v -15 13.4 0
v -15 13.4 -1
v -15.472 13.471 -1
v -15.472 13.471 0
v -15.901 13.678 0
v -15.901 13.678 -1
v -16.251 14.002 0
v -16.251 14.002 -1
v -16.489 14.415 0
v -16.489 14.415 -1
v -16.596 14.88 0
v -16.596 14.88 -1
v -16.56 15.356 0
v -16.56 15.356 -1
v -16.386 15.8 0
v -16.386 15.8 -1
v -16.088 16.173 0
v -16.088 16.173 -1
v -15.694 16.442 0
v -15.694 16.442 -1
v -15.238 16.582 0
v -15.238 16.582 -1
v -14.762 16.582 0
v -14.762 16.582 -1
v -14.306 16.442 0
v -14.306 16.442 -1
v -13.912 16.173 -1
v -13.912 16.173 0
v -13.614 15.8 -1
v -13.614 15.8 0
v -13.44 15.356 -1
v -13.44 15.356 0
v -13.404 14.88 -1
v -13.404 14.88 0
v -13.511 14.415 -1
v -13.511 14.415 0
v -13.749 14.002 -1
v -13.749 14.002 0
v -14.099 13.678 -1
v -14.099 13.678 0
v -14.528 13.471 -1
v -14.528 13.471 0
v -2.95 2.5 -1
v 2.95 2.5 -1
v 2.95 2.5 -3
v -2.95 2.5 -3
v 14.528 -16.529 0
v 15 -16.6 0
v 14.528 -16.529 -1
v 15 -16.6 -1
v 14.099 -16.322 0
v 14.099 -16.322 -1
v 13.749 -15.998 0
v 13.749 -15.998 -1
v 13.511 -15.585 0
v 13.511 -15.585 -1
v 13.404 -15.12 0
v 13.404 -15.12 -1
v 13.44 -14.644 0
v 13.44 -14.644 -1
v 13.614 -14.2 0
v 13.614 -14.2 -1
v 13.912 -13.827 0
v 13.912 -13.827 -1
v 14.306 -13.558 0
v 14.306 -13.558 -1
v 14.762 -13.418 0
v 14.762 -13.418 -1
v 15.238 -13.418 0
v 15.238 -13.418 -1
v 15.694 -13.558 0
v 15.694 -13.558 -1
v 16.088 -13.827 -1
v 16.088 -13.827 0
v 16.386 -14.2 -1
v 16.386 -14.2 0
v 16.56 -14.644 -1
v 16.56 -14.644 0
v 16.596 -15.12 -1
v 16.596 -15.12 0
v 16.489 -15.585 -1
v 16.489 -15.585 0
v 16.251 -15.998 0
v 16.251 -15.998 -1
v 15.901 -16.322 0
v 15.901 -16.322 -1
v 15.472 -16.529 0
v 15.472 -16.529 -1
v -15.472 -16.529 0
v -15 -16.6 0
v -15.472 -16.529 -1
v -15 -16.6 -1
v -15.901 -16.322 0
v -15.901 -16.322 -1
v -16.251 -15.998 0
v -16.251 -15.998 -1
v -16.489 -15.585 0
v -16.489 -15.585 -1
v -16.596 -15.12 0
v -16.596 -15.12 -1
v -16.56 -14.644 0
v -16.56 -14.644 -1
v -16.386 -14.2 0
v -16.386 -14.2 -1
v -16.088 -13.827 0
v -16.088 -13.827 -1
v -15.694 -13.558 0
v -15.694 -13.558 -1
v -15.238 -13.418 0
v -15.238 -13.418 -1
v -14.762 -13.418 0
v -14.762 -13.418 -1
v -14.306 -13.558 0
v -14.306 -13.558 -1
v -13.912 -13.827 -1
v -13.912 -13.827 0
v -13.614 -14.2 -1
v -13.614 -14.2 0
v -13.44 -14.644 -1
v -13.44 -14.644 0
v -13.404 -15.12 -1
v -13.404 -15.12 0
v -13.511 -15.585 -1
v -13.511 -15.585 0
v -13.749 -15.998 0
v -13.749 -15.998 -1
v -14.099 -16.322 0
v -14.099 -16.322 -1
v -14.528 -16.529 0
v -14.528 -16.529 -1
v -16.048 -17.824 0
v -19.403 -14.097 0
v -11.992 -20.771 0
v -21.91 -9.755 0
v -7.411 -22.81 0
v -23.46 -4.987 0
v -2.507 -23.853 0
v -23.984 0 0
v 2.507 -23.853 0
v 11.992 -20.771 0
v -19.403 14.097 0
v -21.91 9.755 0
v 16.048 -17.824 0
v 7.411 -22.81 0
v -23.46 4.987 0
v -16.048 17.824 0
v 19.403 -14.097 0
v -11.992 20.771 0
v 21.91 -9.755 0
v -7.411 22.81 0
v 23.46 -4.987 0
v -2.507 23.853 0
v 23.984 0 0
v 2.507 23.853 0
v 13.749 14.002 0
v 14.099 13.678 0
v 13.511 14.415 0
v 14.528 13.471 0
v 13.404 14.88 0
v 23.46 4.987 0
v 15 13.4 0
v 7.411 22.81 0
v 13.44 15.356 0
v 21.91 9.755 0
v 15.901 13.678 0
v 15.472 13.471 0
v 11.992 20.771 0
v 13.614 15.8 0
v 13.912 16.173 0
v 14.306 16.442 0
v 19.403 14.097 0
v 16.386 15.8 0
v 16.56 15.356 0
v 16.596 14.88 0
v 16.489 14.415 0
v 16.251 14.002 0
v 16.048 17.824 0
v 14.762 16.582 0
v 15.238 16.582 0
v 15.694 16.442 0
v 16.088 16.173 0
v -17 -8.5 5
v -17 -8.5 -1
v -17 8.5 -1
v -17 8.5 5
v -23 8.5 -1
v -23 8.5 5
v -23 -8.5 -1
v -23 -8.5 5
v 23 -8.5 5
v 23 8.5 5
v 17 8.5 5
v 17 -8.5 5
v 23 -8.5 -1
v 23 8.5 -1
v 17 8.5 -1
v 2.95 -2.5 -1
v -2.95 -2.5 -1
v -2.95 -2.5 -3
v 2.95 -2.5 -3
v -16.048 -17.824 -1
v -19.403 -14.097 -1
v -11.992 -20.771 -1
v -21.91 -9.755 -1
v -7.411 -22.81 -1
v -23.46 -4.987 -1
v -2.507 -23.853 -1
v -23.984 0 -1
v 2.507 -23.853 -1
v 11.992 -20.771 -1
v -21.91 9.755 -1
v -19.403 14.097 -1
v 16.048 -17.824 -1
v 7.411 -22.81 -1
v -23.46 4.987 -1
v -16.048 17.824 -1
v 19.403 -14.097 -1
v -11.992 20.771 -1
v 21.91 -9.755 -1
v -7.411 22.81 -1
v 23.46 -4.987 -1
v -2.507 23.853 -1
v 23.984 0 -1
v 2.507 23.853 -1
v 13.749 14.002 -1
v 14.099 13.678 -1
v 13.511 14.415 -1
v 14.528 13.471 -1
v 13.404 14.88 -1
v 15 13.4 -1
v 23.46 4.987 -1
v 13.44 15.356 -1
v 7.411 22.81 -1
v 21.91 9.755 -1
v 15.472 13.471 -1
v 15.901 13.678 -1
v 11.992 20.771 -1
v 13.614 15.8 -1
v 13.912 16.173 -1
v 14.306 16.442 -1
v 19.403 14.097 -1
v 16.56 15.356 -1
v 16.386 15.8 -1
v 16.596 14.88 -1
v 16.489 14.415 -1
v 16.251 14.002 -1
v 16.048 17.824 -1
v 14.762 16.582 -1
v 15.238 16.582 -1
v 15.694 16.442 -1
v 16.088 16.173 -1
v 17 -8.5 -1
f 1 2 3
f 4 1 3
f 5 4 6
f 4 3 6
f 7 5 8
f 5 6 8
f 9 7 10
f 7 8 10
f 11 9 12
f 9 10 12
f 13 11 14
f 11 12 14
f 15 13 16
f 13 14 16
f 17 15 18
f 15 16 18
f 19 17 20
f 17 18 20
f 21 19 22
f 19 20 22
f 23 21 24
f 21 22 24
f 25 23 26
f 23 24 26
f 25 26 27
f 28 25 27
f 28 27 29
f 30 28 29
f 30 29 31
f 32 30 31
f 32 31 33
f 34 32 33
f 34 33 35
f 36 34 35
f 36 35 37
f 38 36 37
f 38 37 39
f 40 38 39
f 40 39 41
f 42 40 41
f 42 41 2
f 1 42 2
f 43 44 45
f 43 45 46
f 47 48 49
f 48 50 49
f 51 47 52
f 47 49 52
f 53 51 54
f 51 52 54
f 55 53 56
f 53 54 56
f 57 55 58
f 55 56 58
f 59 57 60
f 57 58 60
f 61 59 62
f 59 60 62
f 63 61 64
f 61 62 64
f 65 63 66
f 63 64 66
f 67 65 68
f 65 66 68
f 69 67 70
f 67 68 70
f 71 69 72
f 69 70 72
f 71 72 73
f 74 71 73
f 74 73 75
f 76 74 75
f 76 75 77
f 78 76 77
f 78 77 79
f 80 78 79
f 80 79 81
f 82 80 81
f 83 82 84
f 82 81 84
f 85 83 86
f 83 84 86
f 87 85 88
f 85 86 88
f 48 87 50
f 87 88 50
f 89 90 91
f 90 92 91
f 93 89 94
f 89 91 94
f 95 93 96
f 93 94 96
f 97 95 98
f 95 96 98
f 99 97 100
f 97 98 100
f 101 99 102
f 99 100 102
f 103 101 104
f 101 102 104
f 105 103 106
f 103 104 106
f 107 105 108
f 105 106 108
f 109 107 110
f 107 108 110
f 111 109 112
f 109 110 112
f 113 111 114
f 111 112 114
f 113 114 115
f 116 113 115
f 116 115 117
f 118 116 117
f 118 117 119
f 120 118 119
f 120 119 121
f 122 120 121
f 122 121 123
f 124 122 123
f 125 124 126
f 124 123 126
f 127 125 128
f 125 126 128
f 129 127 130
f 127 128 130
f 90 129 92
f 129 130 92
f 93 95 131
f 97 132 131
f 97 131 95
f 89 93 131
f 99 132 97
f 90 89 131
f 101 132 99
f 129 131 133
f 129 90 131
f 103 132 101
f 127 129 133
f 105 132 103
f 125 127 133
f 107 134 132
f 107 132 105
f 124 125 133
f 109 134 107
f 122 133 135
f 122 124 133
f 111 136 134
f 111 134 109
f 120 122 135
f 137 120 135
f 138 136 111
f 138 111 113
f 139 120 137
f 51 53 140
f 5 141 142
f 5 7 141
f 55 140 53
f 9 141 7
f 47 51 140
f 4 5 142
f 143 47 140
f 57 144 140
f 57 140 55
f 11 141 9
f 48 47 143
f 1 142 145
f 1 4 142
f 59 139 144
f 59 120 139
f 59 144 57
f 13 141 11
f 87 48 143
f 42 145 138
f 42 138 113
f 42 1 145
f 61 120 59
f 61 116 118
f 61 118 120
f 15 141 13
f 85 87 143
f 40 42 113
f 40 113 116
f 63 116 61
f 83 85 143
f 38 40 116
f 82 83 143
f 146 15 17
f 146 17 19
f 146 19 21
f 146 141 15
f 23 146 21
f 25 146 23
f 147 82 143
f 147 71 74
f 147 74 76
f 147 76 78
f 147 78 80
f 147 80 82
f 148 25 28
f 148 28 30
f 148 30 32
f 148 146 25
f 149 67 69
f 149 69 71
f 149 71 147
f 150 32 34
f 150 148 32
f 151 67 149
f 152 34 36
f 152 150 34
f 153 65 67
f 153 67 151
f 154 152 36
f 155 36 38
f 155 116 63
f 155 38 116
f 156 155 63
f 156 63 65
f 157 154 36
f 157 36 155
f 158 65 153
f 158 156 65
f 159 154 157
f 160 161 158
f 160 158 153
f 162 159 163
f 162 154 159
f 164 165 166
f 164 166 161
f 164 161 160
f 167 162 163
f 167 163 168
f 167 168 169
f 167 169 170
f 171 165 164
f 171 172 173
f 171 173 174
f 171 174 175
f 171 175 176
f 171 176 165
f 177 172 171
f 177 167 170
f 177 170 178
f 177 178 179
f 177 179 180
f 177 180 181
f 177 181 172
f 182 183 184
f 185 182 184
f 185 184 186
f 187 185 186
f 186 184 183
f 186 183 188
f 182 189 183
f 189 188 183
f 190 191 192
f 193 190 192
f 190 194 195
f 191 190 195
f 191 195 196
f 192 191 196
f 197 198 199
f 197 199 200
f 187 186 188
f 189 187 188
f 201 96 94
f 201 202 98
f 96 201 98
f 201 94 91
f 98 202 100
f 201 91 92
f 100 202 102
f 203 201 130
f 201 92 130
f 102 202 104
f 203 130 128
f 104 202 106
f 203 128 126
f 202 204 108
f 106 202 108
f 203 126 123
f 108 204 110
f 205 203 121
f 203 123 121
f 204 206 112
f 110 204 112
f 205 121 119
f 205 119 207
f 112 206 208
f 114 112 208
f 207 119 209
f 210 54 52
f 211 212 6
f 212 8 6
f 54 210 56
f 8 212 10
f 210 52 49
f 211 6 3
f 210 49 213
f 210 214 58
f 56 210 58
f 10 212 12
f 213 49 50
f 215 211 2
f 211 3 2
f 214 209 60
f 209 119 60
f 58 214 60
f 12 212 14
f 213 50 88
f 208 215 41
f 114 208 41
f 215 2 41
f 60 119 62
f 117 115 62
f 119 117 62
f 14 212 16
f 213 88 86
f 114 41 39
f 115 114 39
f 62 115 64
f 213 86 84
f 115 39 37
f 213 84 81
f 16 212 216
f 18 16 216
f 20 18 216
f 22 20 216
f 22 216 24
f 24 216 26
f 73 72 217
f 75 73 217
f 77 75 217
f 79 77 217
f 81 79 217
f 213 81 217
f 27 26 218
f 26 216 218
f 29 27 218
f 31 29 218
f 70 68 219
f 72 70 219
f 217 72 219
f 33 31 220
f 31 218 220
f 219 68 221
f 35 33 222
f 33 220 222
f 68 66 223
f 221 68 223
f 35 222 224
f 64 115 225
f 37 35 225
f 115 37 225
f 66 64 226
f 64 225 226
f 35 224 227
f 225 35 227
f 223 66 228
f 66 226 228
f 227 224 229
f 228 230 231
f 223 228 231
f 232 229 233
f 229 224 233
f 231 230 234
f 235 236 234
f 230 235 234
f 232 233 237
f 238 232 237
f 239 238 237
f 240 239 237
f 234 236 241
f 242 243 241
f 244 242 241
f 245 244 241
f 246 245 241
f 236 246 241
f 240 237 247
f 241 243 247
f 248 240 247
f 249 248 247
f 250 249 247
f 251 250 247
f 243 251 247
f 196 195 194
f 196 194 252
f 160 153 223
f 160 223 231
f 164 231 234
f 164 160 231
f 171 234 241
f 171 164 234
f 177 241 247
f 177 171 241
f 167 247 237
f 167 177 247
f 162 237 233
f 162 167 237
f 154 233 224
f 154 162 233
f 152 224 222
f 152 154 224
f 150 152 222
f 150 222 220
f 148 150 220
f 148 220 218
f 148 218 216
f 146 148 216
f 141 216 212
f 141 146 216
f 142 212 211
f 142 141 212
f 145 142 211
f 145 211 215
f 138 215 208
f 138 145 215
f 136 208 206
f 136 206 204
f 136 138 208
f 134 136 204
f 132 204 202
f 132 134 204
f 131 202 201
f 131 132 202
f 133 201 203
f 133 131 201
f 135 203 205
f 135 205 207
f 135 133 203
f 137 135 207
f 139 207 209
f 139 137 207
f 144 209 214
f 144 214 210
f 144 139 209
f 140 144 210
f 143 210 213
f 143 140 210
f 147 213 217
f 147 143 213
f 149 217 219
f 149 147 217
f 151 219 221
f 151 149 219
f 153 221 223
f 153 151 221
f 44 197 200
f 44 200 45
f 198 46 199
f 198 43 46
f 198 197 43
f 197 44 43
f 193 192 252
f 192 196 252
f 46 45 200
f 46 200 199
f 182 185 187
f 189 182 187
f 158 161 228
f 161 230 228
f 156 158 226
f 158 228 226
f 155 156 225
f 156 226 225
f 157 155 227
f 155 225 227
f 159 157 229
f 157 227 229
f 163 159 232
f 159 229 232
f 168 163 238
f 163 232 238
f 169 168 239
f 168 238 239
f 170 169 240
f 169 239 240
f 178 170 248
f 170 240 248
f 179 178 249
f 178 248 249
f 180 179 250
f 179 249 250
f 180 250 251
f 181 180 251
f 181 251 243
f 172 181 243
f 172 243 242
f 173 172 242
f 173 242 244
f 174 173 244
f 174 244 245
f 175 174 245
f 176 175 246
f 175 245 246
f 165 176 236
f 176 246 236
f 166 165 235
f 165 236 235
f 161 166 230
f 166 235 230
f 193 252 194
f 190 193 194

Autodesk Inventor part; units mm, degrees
ref_plane "YZ Plane" through (0, 0, 0) normal (1, 0, 0) x (0, 1, 0)
ref_plane "XZ Plane" through (0, 0, 0) normal (0, 1, 0) x (-1, 0, 0)
ref_plane "XY Plane" through (0, 0, 0) normal (0, 0, 1) x (1, 0, 0)
sketch "Skizze1" plane through (0, 0, 0) normal (0, 0, 1) x (1, 0, 0)
  circle A0 centre (0, 0) radius 25
  circle A1 centre (0, 0) radius 23.984
  circle A2 centre (0, 0) radius 21.2132 construction
  line L0 (-15, 15) -> (15, 15) construction
  line L1 (15, 15) -> (15, -15) construction
  line L2 (15, -15) -> (-15, -15) construction
  line L3 (-15, -15) -> (-15, 15) construction
  point P0 (15, 15)
  point P1 (15, -15)
  dimension "d0" = 50
  dimension "d1" = 1.016
  dimension "d2" = 30
extrude "Extrusion1" add sketch "Skizze1" against normal blind 1 contours A1
hole "Bohrung1" at (-15, 15, 0) at (15, 15, 0) at (15, -15, 0) at (-15, -15, 0) direction (0, 0, -1) diameter 3.2 end through all
sketch "Skizze2" plane through (0, 0, 0) normal (0, 0, 1) x (1, 0, 0)
  circle A0 centre (15, -15) radius 1.6 projected
  circle A1 centre (-15, 15) radius 1.6 projected
  circle A2 centre (15, 15) radius 1.6 projected
  circle A3 centre (-15, -15) radius 1.6 projected
  circle A4 centre (0, 0) radius 23.984 projected
  line L0 (-25.6213, 25.3721) -> (25.184, 25.3721) construction
  line L1 (25.184, 25.3721) -> (25.184, -25.4332) construction
  line L2 (25.184, -25.4332) -> (-25.6213, -25.4332) construction
  line L3 (-25.6213, -25.4332) -> (-25.6213, 25.3721) construction
sketch "Skizze3" plane through (0, 0, 0) normal (0, 0, 1) x (1, 0, 0)
  circle A0 centre (0, 0) radius 23.984 projected
  line L0 (-2.5, 2.5) -> (2.5, 2.5)
  line L1 (2.5, 2.5) -> (2.5, -2.5)
  line L2 (2.5, -2.5) -> (-2.5, -2.5)
  line L3 (-2.5, -2.5) -> (-2.5, 2.5)
  line L4 (-15, 2.5) -> (-10, 2.5)
  line L5 (-10, 2.5) -> (-10, -2.5)
  line L6 (-10, -2.5) -> (-15, -2.5)
  line L7 (-15, -2.5) -> (-15, 2.5)
  line L8 (-15, 2.5) -> (-10, -2.5) construction
  line L9 (-2.5, 2.5) -> (2.5, -2.5) construction
  line L10 (2.5, -2.5) -> (0, 0) construction
  line L11 (0, 0) -> (-12.5, 0) construction
  line L12 (-2.5, -15) -> (-2.5, -10)
  line L13 (-2.5, -10) -> (2.5, -10)
  line L14 (2.5, -10) -> (2.5, -15)
  line L15 (2.5, -15) -> (-2.5, -15)
  line L16 (15, -2.5) -> (10, -2.5)
  line L17 (10, -2.5) -> (10, 2.5)
  line L18 (10, 2.5) -> (15, 2.5)
  line L19 (15, 2.5) -> (15, -2.5)
  line L20 (2.5, 15) -> (2.5, 10)
  line L21 (2.5, 10) -> (-2.5, 10)
  line L22 (-2.5, 10) -> (-2.5, 15)
  line L23 (-2.5, 15) -> (2.5, 15)
  dimension "d24" = 5
  dimension "d25" = 12.5
  dimension "d28" = 360
extrude "Extrusion2" [suppressed]
sketch "Skizze4" plane through (0, 0, -1) normal (0, 0, -1) x (-1, 0, 0)
  circle A0 centre (0, 0) radius 23.984 projected
  line L0 (-2.95, 2.5) -> (2.95, 2.5)
  line L1 (2.95, 2.5) -> (2.95, -2.5)
  line L2 (2.95, -2.5) -> (-2.95, -2.5)
  line L3 (-2.95, -2.5) -> (-2.95, 2.5)
  line L4 (-2.95, -2.5) -> (2.95, 2.5) construction
  dimension "d33" = 5.9
  dimension "d34" = 5
extrude "Extrusion3" add sketch "Skizze4" along normal blind 2 separate body contours L0 L1 L2 L3
sketch "Skizze5" plane through (0, 0, -1) normal (0, 0, -1) x (-1, 0, 0)
  circle A0 centre (0, 0) radius 23.984 projected
  line L0 (-23, 8.5) -> (-17, 8.5)
  line L1 (-17, 8.5) -> (-17, -8.5)
  line L2 (-17, -8.5) -> (-23, -8.5)
  line L3 (-23, -8.5) -> (-23, 8.5)
  line L4 (17, 8.5) -> (23, 8.5)
  line L5 (23, 8.5) -> (23, -8.5)
  line L6 (23, -8.5) -> (17, -8.5)
  line L7 (17, -8.5) -> (17, 8.5)
  line L8 (-23, 0) -> (23, 0) construction
  line L9 (-20, 8.5) -> (-20, -8.5) construction
  point P0 (0, 0)
  dimension "d38" = 17
  dimension "d39" = 6
  dimension "d40" = 20
extrude "Extrusion4" add sketch "Skizze5" against normal blind 6 contours L5 A0 L6 L7 L4 | A0 L4 L5 | L5 L6 A0 | L0 L1 L2 A0 L3 | A0 L3 L0 | L2 L3 A0 bodies 2
sketch "Skizze6" plane through (0, 0, -1) normal (0, 0, -1) x (-1, 0, 0)
  line L0 (-26.2075, 26.1914) -> (26.4628, 26.1914) construction
  line L1 (26.4628, 26.1914) -> (26.4628, -26.479) construction
  line L2 (26.4628, -26.479) -> (-26.2075, -26.479) construction
  line L3 (-26.2075, -26.479) -> (-26.2075, 26.1914) construction
ref_plane "Arbeitsebene1" through (-15, -15, -67.8444) normal (-0.7071, 0.7071, 0) x (0, 0, 1)
properties part number "Encoder without LEDs"
